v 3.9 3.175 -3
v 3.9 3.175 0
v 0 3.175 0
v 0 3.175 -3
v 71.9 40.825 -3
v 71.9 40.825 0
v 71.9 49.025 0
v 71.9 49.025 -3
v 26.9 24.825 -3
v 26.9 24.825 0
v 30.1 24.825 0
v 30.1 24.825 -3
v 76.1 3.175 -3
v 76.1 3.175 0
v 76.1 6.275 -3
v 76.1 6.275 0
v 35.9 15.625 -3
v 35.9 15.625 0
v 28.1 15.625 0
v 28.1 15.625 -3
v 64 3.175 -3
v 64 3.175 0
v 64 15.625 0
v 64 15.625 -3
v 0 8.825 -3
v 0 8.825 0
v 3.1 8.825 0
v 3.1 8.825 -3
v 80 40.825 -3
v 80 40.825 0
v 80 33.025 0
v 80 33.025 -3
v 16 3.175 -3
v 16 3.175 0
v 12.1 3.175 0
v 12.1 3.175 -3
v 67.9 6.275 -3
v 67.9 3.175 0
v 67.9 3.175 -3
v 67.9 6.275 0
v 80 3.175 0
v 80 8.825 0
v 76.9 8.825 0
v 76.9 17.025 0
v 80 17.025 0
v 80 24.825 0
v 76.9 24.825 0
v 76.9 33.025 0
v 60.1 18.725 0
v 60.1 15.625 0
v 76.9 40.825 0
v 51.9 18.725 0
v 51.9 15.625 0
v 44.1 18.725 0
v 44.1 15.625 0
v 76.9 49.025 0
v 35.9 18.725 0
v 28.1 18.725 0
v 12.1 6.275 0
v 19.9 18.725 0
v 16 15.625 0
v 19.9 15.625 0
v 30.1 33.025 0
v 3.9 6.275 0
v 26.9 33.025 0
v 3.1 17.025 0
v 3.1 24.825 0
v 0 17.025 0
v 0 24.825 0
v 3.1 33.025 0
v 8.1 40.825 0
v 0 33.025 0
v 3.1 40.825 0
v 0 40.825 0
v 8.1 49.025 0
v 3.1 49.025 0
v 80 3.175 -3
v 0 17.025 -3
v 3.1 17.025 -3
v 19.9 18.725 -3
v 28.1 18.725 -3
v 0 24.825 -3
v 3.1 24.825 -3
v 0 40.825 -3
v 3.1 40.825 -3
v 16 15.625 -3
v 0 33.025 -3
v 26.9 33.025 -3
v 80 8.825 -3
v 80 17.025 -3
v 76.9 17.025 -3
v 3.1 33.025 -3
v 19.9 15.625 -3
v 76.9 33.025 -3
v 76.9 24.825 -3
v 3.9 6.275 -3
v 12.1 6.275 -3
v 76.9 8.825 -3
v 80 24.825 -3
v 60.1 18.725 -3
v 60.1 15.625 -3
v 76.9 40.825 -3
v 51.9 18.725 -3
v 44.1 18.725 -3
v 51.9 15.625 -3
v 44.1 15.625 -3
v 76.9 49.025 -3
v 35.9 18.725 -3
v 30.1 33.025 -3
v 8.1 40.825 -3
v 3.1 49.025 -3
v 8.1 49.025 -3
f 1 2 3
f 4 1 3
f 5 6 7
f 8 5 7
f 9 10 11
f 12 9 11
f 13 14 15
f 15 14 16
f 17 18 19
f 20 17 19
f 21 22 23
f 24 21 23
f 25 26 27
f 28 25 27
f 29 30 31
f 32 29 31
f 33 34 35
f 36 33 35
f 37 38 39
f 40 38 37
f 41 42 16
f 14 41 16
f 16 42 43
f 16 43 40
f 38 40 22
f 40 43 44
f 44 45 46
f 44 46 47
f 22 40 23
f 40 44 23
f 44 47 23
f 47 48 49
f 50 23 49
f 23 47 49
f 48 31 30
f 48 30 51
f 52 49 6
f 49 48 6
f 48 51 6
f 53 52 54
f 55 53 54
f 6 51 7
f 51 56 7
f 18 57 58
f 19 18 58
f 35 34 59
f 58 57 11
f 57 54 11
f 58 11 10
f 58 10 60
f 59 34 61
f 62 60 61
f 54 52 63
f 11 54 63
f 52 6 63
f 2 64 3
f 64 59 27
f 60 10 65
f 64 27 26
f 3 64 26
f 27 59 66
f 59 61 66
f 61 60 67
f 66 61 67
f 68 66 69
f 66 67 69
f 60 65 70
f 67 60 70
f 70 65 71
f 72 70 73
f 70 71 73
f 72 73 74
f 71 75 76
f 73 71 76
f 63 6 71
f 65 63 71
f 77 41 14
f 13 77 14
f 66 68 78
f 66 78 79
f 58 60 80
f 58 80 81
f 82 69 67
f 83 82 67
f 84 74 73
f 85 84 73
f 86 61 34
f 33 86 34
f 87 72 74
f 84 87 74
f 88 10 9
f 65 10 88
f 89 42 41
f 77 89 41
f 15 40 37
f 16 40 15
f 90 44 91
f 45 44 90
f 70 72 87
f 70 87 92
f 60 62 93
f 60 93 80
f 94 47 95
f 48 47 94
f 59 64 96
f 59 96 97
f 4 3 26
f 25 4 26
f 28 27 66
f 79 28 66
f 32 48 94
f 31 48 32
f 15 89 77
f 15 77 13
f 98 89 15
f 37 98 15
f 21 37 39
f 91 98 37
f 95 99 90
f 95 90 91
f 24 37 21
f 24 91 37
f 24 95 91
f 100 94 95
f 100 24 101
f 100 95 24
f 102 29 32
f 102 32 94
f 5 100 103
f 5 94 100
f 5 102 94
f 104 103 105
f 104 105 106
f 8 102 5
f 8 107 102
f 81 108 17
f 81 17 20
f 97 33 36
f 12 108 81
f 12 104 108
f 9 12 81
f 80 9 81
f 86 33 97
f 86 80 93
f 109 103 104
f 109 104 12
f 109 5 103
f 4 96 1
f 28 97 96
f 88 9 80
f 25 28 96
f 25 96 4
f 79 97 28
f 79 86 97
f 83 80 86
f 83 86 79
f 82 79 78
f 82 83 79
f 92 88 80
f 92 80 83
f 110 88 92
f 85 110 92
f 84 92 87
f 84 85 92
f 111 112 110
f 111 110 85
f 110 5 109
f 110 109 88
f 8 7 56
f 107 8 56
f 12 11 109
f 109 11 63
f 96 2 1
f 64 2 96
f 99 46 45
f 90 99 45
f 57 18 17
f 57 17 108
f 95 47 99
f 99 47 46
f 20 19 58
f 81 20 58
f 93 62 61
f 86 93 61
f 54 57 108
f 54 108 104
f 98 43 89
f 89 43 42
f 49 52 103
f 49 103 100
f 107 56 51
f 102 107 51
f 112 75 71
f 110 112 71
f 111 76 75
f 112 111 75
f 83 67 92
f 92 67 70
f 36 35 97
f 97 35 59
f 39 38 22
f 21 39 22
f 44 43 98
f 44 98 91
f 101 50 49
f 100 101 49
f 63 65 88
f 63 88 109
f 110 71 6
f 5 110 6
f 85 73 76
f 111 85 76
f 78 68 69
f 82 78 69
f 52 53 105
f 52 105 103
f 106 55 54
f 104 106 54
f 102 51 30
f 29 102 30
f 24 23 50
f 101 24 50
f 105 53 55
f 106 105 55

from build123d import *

# Parameters (mm, degrees)
BOSS_EXTRUDE1_DEPTH = 3
SKETCH3_W           = 8.2
SKETCH3_H           = 3.2
SKETCH3_W_2         = 3.2
SKETCH3_H_2         = 8.2
CUT_EXTRUDE3_DEPTH  = 4


with BuildPart() as part:
    # Sketch1 → Boss-Extrude1 (new body)
    with BuildSketch(Plane.XY):
        Polygon((0, 52.125), (11.2, 52.125), (11.2, 43.925), (16.5, 43.925), (16.5, 40.925), (63.5, 40.925), (63.5, 43.925), (68.8, 43.925), (68.8, 52.125), (80, 52.125), (80, 3.175), (64, 3.175), (64, 15.625), (16, 15.625), (16, 3.175), (0, 3.175), align=None)
    extrude(amount=-BOSS_EXTRUDE1_DEPTH)

    # Sketch3 → Cut-Extrude3 (cut, through all)
    with BuildSketch(Plane.XY):
        with Locations((40, 17.125)):
            Rectangle(SKETCH3_W, SKETCH3_H)
        with Locations((56, 17.125)):
            Rectangle(SKETCH3_W, SKETCH3_H)
        with Locations((24, 17.125)):
            Rectangle(SKETCH3_W, SKETCH3_H)
        with Locations((78.5, 12.925)):
            Rectangle(SKETCH3_W_2, SKETCH3_H_2)
        Polygon((3.1, 40.825), (3.1, 49.025), (8.1, 49.025), (8.1, 40.825), (71.9, 40.825), (71.9, 49.025), (76.9, 49.025), (76.9, 40.825), (80.1, 40.825), (80.1, 52.225), (68.7, 52.225), (68.7, 44.025), (11.3, 44.025), (11.3, 52.225), (-0.1, 52.225), (-0.1, 40.825), align=None)
        with Locations((28.5, 28.925)):
            Rectangle(SKETCH3_W_2, SKETCH3_H_2)
        with Locations((8, 4.675)):
            Rectangle(SKETCH3_W, SKETCH3_H)
        with Locations((1.5, 12.925)):
            Rectangle(SKETCH3_W_2, SKETCH3_H_2)
        with Locations((1.5, 28.925)):
            Rectangle(SKETCH3_W_2, SKETCH3_H_2)
        with Locations((78.5, 28.925)):
            Rectangle(SKETCH3_W_2, SKETCH3_H_2)
        with Locations((72, 4.675)):
            Rectangle(SKETCH3_W, SKETCH3_H)
    extrude(amount=-CUT_EXTRUDE3_DEPTH, mode=Mode.SUBTRACT)


solid = part.part
